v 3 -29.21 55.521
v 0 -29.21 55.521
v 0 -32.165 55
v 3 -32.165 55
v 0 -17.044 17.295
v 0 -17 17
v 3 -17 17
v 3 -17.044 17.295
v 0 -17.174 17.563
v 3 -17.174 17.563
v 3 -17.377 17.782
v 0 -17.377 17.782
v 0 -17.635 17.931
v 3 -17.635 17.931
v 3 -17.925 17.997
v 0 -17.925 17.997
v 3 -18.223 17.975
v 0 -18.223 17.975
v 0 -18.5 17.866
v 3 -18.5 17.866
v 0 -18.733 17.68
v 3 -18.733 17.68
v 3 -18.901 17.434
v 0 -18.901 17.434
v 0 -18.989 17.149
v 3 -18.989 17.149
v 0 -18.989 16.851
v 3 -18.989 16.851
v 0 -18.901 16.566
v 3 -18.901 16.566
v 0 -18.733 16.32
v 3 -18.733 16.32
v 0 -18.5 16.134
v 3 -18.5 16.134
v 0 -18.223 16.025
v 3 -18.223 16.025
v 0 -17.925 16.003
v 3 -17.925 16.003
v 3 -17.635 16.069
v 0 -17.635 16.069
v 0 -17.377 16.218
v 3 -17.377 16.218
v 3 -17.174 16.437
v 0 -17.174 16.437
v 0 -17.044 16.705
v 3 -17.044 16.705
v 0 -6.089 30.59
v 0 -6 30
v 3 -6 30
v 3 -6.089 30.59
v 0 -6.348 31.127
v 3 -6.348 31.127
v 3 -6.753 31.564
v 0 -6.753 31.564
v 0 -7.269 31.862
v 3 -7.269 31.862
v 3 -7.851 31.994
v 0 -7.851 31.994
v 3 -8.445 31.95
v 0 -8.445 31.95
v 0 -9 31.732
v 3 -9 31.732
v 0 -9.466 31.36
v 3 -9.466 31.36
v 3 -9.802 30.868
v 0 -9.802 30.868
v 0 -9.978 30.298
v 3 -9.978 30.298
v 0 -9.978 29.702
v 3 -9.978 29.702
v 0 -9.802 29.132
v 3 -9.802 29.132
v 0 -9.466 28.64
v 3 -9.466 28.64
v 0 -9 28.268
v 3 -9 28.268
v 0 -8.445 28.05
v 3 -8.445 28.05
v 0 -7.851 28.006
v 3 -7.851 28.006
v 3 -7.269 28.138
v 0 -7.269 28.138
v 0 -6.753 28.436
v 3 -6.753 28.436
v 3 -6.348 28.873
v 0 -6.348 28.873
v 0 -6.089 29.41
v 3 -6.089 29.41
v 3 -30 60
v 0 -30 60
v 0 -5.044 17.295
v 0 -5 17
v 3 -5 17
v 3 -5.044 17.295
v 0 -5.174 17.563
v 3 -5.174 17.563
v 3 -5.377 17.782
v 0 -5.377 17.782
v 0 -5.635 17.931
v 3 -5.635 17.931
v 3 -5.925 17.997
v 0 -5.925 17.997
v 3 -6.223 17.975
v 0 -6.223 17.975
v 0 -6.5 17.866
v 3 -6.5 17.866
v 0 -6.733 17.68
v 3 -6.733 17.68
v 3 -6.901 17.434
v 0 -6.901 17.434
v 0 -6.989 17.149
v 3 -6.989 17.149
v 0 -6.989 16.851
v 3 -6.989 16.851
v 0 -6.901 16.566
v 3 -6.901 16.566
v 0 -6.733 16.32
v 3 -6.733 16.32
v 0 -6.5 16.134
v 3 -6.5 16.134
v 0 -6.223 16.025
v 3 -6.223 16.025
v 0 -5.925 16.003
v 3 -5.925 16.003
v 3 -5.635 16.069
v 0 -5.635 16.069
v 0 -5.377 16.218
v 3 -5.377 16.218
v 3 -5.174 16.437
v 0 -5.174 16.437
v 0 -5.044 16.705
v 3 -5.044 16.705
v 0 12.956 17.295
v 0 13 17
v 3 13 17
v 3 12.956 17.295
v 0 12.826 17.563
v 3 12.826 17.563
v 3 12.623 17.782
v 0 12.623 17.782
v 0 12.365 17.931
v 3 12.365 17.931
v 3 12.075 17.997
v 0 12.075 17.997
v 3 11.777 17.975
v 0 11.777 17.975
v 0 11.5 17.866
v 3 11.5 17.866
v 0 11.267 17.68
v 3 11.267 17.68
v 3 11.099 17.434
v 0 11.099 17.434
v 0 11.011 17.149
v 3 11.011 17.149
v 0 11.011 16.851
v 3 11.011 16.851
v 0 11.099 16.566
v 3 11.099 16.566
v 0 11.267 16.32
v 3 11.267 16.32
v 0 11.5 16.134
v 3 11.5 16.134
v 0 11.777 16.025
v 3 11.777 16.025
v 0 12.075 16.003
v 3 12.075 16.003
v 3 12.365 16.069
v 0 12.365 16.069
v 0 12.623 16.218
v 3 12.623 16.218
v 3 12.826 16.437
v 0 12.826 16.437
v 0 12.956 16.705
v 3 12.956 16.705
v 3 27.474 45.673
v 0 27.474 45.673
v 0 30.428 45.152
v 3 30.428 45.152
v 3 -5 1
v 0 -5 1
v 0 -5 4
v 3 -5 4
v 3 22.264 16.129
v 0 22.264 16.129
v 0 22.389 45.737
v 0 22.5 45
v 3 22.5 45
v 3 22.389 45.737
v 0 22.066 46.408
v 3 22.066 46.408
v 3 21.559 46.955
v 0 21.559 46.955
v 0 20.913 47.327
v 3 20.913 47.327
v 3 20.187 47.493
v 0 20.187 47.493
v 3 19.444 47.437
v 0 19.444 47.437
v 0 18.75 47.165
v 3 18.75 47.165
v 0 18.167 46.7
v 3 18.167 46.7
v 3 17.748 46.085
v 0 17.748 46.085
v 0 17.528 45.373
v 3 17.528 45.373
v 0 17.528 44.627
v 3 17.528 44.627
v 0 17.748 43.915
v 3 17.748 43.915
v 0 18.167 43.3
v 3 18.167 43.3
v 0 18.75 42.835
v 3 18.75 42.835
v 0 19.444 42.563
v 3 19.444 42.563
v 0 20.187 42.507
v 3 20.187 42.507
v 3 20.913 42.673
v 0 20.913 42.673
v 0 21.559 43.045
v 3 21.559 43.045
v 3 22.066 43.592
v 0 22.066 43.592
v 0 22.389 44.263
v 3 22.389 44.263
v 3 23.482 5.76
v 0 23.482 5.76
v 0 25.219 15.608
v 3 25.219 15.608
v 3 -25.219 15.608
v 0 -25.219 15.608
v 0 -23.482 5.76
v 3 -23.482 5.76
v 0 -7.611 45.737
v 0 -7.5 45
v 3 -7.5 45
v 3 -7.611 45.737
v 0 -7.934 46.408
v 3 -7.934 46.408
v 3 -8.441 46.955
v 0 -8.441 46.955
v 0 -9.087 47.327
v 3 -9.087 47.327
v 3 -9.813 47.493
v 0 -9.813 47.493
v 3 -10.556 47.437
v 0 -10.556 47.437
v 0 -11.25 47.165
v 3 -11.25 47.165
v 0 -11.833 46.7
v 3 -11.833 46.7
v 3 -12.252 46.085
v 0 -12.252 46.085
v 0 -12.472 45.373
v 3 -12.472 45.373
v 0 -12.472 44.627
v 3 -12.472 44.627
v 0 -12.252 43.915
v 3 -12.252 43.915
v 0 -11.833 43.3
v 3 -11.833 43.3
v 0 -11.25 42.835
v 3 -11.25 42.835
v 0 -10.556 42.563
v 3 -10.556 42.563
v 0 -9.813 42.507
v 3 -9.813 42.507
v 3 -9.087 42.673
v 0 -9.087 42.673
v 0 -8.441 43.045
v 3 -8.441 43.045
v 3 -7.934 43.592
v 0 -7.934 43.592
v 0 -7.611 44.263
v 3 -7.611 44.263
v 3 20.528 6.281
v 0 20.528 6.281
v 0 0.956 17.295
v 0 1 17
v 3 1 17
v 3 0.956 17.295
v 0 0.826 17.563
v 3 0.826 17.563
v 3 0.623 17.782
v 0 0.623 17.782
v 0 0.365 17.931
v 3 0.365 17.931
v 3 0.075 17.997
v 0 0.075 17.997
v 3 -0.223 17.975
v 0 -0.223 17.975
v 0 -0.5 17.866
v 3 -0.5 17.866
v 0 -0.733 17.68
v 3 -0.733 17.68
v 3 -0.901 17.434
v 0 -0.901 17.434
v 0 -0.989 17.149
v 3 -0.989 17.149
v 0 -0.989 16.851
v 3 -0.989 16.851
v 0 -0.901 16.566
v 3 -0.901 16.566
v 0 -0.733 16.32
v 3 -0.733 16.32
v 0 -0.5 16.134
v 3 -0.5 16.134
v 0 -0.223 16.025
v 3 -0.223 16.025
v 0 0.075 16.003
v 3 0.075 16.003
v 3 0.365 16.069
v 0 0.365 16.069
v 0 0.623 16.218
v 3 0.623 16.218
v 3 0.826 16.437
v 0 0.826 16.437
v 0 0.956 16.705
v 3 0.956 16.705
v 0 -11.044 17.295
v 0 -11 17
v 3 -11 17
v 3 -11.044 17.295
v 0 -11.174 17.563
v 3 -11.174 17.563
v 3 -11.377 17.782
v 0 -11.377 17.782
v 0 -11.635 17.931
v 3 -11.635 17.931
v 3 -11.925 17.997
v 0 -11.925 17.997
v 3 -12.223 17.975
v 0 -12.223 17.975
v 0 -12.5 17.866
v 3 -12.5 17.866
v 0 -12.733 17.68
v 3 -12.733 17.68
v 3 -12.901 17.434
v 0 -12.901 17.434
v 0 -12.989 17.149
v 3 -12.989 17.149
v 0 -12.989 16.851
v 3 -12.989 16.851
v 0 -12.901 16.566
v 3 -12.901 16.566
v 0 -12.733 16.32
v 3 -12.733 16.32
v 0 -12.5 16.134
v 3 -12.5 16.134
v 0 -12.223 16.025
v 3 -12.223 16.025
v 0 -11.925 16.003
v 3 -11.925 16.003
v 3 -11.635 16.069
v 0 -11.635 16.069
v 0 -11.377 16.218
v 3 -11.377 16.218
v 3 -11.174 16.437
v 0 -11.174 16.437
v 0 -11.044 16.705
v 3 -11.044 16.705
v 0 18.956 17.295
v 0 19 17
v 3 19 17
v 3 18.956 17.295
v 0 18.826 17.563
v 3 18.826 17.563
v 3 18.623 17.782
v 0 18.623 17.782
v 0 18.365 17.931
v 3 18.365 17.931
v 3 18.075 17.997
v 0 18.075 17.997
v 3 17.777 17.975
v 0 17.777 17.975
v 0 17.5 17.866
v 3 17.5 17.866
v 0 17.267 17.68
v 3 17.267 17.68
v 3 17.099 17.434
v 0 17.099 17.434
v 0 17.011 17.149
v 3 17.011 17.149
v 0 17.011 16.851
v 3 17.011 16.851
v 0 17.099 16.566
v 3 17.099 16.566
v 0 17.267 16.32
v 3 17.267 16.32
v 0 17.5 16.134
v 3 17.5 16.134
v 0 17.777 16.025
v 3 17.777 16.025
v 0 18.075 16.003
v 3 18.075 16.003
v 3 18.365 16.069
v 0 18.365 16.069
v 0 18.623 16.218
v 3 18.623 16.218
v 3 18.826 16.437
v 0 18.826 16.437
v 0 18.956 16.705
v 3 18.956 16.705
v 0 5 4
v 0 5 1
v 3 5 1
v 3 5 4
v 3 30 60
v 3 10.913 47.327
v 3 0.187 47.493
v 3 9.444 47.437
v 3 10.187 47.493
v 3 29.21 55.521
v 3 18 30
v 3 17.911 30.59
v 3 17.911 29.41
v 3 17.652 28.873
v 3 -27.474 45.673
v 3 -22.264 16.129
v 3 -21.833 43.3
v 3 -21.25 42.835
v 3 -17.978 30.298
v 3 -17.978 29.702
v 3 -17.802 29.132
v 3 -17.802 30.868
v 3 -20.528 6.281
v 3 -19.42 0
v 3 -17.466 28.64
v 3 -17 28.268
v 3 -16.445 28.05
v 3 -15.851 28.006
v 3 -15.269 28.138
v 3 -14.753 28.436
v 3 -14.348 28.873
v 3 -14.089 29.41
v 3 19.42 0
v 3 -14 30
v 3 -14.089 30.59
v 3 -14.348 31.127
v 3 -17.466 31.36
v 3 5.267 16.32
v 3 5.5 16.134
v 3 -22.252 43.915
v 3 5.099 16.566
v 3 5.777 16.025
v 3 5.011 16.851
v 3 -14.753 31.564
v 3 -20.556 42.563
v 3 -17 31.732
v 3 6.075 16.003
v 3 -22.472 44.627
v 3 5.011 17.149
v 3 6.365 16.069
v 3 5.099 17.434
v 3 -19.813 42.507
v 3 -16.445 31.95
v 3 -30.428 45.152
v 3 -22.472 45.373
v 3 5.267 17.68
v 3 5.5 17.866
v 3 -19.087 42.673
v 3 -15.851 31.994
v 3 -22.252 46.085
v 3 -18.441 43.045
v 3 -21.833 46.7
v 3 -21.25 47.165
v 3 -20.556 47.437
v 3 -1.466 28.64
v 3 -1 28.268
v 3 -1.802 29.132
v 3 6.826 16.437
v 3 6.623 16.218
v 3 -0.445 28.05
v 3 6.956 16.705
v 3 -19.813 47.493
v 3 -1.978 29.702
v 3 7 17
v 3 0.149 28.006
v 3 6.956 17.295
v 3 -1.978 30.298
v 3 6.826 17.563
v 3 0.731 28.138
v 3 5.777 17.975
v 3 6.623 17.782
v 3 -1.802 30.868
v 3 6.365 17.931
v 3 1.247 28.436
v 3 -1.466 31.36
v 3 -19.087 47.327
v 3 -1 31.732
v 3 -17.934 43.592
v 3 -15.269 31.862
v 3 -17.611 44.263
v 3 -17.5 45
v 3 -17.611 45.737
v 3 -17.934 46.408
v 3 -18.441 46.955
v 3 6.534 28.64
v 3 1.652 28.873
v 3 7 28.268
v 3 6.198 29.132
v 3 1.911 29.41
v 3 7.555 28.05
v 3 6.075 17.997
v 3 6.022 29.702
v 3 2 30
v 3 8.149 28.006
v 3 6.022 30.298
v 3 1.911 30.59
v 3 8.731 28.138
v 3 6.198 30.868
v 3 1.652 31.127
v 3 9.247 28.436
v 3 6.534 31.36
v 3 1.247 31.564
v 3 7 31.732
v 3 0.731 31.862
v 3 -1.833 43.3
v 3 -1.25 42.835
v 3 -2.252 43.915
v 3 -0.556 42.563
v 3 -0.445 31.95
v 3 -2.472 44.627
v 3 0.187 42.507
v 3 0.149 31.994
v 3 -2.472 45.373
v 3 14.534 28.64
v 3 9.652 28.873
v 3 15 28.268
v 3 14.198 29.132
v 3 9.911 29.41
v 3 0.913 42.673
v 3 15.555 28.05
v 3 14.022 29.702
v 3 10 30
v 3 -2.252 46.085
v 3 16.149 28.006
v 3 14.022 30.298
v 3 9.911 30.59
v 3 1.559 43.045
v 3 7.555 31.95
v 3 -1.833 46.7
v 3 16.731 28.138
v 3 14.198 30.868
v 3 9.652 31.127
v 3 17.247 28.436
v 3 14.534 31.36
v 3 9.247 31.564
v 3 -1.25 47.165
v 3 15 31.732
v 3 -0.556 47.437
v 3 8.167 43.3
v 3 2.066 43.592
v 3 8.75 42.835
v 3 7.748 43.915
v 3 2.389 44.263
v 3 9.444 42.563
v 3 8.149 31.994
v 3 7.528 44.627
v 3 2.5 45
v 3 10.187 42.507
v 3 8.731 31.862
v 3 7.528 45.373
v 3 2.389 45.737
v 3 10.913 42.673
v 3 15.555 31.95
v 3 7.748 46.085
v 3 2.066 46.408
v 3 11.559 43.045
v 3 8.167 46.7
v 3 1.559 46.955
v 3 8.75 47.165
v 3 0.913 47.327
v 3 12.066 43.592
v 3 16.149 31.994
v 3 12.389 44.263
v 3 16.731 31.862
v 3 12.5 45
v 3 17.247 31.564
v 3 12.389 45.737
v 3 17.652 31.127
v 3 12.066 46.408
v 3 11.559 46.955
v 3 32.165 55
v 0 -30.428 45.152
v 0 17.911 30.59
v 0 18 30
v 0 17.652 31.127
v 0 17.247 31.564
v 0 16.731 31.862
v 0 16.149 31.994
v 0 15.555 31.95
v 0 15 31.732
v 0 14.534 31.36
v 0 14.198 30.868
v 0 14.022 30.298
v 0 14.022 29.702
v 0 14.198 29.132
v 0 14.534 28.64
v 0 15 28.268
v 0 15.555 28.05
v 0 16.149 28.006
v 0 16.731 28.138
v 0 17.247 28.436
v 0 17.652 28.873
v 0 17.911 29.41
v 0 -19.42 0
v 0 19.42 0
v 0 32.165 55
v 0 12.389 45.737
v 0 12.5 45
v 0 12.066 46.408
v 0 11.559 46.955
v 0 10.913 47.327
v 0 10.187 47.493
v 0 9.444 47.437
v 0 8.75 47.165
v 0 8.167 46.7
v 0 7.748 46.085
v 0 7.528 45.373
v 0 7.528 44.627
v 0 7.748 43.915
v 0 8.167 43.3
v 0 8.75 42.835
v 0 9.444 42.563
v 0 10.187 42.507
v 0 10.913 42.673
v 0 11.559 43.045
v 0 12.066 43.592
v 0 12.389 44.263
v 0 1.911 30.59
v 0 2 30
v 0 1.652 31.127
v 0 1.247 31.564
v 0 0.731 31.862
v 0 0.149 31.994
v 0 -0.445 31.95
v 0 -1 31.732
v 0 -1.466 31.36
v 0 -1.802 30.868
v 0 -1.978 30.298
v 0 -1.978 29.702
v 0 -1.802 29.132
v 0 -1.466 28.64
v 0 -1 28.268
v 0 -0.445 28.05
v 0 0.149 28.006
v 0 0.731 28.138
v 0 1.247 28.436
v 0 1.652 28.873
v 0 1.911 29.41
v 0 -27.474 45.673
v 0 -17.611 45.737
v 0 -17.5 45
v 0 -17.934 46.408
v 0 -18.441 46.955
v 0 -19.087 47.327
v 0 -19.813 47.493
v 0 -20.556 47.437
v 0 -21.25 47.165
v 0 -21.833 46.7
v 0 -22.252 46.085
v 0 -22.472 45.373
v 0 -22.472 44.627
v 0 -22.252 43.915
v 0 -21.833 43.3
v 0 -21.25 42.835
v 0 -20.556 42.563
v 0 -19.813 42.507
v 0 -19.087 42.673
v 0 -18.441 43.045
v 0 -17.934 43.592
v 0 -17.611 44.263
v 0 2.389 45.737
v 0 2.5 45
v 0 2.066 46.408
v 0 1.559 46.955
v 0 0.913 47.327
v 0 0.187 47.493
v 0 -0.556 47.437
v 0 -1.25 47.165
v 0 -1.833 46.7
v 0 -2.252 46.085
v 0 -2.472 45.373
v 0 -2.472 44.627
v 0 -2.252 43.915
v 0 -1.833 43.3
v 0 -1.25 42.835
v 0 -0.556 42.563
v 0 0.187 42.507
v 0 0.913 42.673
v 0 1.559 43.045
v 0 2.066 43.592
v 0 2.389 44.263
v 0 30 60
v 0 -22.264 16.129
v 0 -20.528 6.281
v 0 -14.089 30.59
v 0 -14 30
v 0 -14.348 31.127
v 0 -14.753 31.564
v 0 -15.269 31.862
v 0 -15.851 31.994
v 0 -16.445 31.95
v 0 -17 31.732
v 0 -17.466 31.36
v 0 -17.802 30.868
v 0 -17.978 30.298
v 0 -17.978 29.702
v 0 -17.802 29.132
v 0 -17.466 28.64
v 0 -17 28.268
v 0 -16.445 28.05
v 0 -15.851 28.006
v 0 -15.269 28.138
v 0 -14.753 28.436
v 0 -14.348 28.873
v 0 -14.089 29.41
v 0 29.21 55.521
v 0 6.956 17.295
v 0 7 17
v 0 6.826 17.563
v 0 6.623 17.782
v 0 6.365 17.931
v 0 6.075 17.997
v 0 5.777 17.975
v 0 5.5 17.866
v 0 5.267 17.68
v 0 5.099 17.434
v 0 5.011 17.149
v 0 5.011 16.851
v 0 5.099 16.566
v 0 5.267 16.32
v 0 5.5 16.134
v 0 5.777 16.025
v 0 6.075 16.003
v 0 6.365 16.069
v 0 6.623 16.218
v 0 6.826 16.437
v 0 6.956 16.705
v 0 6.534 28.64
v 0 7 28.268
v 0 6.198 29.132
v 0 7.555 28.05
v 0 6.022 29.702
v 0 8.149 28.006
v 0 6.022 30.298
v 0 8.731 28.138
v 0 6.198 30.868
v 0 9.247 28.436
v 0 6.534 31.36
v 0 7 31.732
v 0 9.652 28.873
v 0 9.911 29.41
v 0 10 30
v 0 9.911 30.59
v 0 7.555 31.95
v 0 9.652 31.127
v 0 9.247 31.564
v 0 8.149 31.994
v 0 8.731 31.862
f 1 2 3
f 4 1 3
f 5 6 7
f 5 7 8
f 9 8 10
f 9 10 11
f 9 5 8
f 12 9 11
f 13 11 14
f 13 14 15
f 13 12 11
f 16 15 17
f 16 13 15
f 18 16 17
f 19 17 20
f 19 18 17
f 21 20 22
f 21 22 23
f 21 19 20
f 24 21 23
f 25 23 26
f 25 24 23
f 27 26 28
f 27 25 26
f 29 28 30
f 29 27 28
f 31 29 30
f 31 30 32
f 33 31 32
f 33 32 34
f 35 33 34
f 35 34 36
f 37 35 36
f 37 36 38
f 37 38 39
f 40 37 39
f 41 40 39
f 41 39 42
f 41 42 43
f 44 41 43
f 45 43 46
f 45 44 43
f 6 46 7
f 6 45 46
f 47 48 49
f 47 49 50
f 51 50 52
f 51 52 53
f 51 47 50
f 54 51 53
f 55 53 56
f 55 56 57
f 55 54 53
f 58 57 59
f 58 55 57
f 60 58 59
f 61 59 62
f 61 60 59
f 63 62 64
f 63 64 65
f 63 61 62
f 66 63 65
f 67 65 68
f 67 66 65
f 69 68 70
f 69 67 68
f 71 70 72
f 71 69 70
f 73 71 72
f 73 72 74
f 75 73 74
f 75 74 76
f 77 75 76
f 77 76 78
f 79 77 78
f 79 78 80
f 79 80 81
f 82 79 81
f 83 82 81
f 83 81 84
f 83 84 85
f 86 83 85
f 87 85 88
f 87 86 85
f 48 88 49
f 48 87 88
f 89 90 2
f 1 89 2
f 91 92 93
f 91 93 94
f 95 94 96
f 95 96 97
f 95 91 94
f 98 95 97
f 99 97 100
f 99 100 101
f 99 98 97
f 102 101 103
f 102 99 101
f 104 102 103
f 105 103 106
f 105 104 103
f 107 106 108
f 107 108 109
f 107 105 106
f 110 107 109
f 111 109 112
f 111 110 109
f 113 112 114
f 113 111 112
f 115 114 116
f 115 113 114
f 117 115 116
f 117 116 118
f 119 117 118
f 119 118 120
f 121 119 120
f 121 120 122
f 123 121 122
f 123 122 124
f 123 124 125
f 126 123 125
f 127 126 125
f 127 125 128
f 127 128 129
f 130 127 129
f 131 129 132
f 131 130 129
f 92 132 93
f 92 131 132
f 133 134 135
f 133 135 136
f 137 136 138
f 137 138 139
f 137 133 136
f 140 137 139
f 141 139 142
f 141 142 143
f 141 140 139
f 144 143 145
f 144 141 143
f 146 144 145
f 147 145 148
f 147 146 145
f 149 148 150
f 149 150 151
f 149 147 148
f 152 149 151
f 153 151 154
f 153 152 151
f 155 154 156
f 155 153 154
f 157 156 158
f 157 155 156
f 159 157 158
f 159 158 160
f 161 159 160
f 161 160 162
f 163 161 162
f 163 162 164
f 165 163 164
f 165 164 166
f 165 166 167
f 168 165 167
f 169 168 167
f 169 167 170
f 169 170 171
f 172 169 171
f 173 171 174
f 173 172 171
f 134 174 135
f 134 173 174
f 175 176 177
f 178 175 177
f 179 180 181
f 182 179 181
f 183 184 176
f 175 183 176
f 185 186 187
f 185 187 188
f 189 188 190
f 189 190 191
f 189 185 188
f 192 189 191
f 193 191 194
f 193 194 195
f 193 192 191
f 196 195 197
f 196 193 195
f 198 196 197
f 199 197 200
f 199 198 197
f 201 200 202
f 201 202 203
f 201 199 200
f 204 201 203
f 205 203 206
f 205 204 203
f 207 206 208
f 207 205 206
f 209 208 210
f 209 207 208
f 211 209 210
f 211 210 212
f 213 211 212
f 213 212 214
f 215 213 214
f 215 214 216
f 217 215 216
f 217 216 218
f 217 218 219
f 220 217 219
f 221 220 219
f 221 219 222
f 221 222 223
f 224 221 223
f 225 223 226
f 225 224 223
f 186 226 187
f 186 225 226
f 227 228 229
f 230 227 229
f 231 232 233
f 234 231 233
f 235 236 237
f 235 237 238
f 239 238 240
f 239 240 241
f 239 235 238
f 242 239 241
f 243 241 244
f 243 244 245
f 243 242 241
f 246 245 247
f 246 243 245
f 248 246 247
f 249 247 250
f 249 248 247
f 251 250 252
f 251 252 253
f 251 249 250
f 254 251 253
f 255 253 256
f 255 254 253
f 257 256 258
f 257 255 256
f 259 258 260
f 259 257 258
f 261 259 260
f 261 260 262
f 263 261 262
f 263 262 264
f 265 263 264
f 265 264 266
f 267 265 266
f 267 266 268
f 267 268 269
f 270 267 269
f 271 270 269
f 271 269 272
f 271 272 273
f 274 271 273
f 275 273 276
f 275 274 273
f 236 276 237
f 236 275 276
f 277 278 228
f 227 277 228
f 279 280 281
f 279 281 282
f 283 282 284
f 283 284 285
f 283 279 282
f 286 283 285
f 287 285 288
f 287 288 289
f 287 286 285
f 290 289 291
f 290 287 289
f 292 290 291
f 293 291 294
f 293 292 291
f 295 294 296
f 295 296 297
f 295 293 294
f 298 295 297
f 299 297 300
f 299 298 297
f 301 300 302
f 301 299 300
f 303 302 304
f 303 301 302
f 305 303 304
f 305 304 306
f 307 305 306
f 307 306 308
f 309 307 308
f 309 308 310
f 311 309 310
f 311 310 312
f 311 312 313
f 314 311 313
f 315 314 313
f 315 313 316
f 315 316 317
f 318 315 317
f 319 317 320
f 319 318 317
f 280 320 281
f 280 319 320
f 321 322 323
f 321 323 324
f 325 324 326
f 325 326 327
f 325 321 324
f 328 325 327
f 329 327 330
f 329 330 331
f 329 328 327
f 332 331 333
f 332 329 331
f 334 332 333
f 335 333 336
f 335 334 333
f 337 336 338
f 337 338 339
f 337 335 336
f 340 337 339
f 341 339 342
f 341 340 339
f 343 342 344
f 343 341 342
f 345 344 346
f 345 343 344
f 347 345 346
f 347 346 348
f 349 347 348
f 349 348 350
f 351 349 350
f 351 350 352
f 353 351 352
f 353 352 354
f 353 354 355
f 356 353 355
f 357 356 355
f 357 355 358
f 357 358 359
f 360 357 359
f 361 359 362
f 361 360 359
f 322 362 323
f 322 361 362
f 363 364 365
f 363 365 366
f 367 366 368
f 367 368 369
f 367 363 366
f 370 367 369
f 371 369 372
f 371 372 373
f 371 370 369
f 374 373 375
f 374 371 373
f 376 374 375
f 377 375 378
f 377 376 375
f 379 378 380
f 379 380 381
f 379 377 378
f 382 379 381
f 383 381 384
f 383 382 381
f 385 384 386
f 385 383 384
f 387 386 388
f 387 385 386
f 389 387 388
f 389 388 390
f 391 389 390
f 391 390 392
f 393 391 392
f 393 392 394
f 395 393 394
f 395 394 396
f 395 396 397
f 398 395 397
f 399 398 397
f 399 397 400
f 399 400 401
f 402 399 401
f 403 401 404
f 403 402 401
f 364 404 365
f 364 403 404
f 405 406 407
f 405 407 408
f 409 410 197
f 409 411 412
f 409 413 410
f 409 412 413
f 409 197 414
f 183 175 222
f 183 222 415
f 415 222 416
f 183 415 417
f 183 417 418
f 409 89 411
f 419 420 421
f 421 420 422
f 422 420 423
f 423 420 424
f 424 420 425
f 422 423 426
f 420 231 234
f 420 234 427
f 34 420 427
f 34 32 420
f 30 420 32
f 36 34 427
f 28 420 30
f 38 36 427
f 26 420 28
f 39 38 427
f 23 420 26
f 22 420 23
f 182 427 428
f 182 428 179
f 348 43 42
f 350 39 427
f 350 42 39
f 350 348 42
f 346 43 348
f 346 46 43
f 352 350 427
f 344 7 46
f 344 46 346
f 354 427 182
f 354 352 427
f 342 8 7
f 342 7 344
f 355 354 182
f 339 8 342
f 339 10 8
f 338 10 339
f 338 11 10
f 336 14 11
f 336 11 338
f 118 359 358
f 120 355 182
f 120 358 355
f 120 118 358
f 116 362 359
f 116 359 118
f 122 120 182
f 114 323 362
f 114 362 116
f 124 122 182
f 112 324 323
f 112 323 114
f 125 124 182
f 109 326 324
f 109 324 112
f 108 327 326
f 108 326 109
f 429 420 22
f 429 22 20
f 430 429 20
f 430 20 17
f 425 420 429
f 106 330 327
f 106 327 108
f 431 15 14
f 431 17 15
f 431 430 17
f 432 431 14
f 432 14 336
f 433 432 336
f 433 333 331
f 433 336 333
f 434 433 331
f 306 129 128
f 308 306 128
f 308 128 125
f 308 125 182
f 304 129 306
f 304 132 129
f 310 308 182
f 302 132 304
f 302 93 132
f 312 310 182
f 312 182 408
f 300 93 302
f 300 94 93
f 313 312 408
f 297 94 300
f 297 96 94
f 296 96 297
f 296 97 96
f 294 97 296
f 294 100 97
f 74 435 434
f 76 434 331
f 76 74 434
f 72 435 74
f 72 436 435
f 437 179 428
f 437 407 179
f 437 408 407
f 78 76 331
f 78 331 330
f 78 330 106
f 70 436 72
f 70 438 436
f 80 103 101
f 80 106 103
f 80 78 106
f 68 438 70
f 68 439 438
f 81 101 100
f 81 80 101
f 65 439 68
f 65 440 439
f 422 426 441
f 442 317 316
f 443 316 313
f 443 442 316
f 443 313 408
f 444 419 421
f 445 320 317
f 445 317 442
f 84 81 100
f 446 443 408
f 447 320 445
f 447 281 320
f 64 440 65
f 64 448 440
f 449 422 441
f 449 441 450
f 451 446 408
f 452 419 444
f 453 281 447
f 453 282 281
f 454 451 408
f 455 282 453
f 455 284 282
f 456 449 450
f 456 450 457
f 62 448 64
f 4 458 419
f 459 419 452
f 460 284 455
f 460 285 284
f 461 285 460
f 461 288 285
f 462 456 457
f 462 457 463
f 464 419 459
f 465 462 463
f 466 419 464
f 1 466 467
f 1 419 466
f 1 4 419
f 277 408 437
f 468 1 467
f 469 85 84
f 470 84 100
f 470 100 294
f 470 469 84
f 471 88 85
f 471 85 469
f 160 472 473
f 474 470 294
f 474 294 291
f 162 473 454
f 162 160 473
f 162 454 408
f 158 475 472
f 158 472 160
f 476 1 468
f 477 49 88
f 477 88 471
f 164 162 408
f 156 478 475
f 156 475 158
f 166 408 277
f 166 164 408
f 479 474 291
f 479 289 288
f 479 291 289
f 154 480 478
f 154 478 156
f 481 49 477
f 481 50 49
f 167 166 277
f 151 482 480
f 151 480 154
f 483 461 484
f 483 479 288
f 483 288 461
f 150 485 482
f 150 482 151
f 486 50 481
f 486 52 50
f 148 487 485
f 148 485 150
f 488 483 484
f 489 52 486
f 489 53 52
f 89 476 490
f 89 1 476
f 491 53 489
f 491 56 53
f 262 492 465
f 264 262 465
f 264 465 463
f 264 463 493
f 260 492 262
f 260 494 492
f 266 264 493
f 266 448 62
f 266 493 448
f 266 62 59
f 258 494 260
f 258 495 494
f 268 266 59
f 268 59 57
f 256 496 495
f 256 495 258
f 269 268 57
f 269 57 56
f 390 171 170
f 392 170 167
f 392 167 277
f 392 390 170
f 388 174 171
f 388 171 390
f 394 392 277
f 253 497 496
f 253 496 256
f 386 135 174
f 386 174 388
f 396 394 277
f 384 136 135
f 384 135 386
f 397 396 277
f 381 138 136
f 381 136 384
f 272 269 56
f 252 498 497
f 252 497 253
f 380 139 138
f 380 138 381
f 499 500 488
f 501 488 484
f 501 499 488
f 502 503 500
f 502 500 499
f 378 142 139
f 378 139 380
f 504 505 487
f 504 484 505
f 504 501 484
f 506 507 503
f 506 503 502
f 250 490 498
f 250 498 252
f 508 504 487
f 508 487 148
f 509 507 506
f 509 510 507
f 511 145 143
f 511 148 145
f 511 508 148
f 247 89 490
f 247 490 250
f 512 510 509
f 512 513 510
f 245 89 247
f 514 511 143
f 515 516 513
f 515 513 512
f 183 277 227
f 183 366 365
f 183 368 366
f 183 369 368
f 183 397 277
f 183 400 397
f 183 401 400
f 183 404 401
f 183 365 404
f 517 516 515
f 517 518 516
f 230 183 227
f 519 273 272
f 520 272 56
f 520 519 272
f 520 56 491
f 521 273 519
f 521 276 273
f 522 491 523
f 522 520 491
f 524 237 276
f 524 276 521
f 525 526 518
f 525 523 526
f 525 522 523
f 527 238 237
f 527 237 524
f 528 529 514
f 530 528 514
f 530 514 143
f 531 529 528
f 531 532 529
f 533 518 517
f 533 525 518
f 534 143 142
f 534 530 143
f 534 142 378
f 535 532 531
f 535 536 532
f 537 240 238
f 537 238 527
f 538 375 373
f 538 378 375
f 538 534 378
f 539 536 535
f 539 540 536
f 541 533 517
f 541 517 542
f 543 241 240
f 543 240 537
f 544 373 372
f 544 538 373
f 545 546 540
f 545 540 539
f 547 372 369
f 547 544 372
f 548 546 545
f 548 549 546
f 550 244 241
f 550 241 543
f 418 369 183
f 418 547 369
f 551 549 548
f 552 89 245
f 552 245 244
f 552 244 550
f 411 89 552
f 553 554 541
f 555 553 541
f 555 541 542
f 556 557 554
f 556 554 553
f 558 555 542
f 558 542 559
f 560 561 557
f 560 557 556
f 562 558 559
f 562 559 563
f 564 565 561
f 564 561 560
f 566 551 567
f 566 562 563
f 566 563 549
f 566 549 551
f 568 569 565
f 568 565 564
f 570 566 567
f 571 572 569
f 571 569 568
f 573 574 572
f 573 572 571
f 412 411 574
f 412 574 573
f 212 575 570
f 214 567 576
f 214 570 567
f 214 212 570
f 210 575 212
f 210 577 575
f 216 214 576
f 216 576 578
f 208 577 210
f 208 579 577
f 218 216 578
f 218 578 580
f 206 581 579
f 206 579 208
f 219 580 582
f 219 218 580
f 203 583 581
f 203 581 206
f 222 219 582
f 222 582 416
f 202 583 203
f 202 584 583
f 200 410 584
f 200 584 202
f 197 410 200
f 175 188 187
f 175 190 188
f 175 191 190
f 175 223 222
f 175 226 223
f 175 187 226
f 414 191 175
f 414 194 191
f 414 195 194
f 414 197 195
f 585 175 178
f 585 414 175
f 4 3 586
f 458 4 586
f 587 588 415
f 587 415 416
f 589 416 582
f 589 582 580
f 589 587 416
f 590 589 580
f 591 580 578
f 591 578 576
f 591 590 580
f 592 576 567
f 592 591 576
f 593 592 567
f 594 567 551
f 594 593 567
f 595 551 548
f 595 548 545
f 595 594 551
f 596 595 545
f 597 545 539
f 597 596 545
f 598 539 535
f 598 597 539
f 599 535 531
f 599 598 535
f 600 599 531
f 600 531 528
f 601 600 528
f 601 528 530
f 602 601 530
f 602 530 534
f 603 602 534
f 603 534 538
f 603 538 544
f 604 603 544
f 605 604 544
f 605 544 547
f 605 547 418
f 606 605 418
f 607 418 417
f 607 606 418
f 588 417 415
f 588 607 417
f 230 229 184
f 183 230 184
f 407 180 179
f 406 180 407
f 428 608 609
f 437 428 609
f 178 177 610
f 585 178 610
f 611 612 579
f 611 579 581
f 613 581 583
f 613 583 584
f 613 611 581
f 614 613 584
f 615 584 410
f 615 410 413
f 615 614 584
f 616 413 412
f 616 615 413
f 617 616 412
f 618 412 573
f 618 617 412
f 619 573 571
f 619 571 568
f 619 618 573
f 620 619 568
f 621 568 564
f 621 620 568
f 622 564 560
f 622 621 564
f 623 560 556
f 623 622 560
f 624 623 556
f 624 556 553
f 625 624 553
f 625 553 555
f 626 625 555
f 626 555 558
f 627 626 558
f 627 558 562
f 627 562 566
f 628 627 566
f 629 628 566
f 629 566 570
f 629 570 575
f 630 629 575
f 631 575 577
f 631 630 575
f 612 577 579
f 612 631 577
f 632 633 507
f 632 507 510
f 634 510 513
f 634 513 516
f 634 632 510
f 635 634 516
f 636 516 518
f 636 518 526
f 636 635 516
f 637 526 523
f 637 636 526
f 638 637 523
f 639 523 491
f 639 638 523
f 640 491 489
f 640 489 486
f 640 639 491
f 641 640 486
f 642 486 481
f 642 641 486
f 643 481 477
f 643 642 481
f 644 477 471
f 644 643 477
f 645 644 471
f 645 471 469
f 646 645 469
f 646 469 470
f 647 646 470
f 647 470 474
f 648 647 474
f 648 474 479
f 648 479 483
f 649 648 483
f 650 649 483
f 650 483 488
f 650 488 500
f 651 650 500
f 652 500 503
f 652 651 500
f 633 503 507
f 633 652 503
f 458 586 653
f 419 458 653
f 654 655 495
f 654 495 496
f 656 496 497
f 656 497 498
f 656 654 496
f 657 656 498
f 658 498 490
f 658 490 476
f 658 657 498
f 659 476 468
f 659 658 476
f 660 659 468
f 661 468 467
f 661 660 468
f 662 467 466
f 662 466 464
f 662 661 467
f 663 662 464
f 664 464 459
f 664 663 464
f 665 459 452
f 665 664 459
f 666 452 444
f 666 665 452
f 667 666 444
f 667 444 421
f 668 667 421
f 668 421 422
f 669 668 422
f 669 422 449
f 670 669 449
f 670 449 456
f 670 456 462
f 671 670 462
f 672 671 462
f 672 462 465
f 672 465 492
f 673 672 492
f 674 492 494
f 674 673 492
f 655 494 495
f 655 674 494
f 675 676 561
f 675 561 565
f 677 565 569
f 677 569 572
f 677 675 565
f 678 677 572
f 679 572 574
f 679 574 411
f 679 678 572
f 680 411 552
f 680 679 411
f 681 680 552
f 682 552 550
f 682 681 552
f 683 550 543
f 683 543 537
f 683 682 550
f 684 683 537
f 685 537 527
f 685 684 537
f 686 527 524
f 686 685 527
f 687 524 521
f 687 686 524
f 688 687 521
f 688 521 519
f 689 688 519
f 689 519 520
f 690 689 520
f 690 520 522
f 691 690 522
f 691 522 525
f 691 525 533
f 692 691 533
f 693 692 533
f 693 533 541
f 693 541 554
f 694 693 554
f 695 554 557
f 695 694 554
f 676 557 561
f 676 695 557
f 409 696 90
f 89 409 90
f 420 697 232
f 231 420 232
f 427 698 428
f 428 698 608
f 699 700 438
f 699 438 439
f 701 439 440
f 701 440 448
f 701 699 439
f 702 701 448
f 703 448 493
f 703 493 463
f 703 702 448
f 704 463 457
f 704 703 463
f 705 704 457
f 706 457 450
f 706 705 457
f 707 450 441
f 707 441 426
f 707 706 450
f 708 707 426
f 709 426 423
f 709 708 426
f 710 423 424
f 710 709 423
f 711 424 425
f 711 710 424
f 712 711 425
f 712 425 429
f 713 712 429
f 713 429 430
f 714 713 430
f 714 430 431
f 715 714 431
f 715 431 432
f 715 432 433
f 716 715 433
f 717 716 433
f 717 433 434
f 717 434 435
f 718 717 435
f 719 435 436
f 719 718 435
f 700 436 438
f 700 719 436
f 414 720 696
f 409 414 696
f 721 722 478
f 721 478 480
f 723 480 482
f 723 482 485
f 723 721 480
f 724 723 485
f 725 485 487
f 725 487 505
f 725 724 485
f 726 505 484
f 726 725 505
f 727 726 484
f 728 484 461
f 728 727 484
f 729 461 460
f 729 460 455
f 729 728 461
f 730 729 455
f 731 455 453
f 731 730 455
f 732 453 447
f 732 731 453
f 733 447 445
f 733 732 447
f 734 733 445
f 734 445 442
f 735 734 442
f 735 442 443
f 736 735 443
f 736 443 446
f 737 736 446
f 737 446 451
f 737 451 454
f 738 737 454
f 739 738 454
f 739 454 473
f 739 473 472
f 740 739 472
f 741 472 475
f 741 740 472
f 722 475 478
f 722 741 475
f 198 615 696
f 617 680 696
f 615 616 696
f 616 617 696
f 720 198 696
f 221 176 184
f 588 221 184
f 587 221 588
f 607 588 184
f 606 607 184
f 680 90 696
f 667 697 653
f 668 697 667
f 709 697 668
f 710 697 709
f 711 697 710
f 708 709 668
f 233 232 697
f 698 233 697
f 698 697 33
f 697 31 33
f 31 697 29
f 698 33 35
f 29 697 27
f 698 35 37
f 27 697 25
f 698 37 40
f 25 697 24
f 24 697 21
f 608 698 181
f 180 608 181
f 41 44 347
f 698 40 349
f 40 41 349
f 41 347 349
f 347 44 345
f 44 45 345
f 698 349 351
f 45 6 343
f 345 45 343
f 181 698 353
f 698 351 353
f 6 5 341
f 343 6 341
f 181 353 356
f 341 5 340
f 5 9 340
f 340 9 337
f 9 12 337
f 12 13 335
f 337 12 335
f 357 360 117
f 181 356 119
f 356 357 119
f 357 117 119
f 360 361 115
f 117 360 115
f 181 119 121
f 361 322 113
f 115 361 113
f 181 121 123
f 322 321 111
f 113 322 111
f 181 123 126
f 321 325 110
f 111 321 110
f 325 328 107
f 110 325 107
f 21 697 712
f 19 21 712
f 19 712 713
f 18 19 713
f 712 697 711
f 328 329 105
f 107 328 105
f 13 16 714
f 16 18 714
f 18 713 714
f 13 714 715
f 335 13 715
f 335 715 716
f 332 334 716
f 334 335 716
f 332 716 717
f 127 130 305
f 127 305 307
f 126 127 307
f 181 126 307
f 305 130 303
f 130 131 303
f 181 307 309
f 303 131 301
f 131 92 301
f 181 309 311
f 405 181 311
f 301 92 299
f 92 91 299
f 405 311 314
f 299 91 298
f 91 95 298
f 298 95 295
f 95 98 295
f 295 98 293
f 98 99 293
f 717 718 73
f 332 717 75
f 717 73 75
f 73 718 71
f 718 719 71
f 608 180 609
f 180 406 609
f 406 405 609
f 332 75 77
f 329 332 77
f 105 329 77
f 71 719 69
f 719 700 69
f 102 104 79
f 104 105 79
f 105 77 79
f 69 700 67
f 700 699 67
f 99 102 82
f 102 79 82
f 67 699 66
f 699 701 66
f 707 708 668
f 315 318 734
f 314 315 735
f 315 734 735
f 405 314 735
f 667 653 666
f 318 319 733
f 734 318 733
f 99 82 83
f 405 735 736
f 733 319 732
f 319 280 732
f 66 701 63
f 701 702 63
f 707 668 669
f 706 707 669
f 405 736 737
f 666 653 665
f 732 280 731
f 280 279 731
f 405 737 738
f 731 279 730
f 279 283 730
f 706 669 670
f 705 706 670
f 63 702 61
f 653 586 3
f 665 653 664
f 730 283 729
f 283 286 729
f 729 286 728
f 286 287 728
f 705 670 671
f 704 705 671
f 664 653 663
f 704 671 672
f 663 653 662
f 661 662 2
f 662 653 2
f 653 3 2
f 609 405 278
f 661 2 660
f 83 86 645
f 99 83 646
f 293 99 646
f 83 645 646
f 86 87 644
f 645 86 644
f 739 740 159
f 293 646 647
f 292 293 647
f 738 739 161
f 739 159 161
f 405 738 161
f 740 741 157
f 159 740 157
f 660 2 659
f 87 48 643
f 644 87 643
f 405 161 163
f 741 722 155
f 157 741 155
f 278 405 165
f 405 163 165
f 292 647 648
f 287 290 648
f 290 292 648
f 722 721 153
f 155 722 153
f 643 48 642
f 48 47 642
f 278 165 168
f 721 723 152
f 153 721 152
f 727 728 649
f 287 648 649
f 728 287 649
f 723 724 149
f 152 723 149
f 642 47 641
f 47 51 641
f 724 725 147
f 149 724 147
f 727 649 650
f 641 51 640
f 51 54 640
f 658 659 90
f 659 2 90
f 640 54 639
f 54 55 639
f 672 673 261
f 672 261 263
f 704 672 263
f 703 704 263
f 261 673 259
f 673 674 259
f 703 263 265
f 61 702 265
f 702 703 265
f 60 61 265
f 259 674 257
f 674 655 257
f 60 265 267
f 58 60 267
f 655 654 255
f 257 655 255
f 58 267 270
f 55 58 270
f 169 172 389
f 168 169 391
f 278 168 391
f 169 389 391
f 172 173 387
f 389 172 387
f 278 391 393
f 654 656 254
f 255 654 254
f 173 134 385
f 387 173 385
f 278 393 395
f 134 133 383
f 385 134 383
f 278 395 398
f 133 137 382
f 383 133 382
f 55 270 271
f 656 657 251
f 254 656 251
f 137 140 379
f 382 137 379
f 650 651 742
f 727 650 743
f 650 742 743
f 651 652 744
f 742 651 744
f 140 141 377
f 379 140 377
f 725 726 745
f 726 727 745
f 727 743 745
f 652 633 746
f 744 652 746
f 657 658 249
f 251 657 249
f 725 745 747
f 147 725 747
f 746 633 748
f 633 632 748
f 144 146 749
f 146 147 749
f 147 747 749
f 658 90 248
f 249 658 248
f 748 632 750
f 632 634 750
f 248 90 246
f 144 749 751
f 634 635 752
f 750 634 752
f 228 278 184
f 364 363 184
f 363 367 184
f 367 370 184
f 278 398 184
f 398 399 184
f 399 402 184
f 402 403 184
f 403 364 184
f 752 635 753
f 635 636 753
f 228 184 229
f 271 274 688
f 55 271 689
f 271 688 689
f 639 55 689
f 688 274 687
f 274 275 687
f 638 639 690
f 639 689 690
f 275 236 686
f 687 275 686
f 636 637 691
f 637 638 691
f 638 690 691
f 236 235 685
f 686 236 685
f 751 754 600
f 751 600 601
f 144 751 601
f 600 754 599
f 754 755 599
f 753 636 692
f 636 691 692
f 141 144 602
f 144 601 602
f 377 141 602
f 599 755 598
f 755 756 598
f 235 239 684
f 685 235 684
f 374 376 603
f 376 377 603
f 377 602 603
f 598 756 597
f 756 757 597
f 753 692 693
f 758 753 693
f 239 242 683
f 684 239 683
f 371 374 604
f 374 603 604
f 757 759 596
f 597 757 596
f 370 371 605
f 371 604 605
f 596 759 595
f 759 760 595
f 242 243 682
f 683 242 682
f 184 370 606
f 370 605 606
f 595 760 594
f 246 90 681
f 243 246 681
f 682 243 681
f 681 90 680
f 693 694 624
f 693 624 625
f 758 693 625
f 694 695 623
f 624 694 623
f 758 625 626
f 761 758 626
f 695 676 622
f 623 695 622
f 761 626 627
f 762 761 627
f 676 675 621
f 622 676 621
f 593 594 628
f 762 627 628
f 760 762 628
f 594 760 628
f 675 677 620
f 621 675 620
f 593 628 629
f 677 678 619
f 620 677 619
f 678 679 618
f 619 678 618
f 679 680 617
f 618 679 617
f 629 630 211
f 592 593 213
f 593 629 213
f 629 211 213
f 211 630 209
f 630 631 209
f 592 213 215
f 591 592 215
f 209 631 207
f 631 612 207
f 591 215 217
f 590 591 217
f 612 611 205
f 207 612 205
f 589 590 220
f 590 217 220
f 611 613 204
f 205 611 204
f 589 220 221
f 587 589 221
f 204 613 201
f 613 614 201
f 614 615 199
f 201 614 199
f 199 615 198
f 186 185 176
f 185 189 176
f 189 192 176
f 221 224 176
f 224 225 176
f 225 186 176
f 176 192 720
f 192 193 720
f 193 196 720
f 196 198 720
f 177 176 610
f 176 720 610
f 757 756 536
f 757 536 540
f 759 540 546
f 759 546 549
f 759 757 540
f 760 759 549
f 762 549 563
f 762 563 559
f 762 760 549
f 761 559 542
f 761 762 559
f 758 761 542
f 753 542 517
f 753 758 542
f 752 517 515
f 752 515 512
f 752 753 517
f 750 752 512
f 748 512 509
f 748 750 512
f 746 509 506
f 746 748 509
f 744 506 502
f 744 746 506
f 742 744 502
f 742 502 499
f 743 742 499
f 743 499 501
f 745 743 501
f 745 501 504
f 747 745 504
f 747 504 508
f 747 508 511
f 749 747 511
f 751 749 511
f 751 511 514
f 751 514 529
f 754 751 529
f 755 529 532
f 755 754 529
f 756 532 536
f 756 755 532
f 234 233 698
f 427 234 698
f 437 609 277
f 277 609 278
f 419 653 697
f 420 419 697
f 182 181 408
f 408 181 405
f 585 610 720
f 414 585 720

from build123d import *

# Parameters (mm, degrees)
F0_W     = 10
F0_H     = 3
F0_R     = 1
F0_R_2   = 2
F0_R_3   = 2.5
F1_DEPTH = 3


with BuildPart() as f1:
    # F0 (on Right) → F1 (new body)
    with BuildSketch(Plane.YZ):
        Polygon((-20.527813, 6.280557), (-19.420381, 0), (19.420381, 0), (20.527813, 6.280557), (23.482236, 5.759612), (25.218718, 15.60769), (22.264295, 16.128634), (27.47374, 45.672867), (30.428163, 45.151922), (32.164645, 55), (29.210222, 55.520945), (30, 60), (-30, 60), (-29.210222, 55.520945), (-32.164645, 55), (-30.428163, 45.151922), (-27.47374, 45.672867), (-22.264295, 16.128634), (-25.218718, 15.60769), (-23.482236, 5.759612), align=None)
        with Locations((0, 2.5)):
            Rectangle(F0_W, F0_H, mode=Mode.SUBTRACT)
        with Locations((-18, 17)):
            Circle(F0_R, mode=Mode.SUBTRACT)
        with Locations((-12, 17)):
            Circle(F0_R, mode=Mode.SUBTRACT)
        with Locations((-6, 17)):
            Circle(F0_R, mode=Mode.SUBTRACT)
        with Locations((0, 17)):
            Circle(F0_R, mode=Mode.SUBTRACT)
        with Locations((6, 17)):
            Circle(F0_R, mode=Mode.SUBTRACT)
        with Locations((12, 17)):
            Circle(F0_R, mode=Mode.SUBTRACT)
        with Locations((18, 17)):
            Circle(F0_R, mode=Mode.SUBTRACT)
        with Locations((-16, 30)):
            Circle(F0_R_2, mode=Mode.SUBTRACT)
        with Locations((-8, 30)):
            Circle(F0_R_2, mode=Mode.SUBTRACT)
        with Locations((0, 30)):
            Circle(F0_R_2, mode=Mode.SUBTRACT)
        with Locations((-20, 45)):
            Circle(F0_R_3, mode=Mode.SUBTRACT)
        with Locations((-10, 45)):
            Circle(F0_R_3, mode=Mode.SUBTRACT)
        with Locations((0, 45)):
            Circle(F0_R_3, mode=Mode.SUBTRACT)
        with Locations((8, 30)):
            Circle(F0_R_2, mode=Mode.SUBTRACT)
        with Locations((16, 30)):
            Circle(F0_R_2, mode=Mode.SUBTRACT)
        with Locations((10, 45)):
            Circle(F0_R_3, mode=Mode.SUBTRACT)
        with Locations((20, 45)):
            Circle(F0_R_3, mode=Mode.SUBTRACT)
    extrude(amount=F1_DEPTH)


solid = f1.part
